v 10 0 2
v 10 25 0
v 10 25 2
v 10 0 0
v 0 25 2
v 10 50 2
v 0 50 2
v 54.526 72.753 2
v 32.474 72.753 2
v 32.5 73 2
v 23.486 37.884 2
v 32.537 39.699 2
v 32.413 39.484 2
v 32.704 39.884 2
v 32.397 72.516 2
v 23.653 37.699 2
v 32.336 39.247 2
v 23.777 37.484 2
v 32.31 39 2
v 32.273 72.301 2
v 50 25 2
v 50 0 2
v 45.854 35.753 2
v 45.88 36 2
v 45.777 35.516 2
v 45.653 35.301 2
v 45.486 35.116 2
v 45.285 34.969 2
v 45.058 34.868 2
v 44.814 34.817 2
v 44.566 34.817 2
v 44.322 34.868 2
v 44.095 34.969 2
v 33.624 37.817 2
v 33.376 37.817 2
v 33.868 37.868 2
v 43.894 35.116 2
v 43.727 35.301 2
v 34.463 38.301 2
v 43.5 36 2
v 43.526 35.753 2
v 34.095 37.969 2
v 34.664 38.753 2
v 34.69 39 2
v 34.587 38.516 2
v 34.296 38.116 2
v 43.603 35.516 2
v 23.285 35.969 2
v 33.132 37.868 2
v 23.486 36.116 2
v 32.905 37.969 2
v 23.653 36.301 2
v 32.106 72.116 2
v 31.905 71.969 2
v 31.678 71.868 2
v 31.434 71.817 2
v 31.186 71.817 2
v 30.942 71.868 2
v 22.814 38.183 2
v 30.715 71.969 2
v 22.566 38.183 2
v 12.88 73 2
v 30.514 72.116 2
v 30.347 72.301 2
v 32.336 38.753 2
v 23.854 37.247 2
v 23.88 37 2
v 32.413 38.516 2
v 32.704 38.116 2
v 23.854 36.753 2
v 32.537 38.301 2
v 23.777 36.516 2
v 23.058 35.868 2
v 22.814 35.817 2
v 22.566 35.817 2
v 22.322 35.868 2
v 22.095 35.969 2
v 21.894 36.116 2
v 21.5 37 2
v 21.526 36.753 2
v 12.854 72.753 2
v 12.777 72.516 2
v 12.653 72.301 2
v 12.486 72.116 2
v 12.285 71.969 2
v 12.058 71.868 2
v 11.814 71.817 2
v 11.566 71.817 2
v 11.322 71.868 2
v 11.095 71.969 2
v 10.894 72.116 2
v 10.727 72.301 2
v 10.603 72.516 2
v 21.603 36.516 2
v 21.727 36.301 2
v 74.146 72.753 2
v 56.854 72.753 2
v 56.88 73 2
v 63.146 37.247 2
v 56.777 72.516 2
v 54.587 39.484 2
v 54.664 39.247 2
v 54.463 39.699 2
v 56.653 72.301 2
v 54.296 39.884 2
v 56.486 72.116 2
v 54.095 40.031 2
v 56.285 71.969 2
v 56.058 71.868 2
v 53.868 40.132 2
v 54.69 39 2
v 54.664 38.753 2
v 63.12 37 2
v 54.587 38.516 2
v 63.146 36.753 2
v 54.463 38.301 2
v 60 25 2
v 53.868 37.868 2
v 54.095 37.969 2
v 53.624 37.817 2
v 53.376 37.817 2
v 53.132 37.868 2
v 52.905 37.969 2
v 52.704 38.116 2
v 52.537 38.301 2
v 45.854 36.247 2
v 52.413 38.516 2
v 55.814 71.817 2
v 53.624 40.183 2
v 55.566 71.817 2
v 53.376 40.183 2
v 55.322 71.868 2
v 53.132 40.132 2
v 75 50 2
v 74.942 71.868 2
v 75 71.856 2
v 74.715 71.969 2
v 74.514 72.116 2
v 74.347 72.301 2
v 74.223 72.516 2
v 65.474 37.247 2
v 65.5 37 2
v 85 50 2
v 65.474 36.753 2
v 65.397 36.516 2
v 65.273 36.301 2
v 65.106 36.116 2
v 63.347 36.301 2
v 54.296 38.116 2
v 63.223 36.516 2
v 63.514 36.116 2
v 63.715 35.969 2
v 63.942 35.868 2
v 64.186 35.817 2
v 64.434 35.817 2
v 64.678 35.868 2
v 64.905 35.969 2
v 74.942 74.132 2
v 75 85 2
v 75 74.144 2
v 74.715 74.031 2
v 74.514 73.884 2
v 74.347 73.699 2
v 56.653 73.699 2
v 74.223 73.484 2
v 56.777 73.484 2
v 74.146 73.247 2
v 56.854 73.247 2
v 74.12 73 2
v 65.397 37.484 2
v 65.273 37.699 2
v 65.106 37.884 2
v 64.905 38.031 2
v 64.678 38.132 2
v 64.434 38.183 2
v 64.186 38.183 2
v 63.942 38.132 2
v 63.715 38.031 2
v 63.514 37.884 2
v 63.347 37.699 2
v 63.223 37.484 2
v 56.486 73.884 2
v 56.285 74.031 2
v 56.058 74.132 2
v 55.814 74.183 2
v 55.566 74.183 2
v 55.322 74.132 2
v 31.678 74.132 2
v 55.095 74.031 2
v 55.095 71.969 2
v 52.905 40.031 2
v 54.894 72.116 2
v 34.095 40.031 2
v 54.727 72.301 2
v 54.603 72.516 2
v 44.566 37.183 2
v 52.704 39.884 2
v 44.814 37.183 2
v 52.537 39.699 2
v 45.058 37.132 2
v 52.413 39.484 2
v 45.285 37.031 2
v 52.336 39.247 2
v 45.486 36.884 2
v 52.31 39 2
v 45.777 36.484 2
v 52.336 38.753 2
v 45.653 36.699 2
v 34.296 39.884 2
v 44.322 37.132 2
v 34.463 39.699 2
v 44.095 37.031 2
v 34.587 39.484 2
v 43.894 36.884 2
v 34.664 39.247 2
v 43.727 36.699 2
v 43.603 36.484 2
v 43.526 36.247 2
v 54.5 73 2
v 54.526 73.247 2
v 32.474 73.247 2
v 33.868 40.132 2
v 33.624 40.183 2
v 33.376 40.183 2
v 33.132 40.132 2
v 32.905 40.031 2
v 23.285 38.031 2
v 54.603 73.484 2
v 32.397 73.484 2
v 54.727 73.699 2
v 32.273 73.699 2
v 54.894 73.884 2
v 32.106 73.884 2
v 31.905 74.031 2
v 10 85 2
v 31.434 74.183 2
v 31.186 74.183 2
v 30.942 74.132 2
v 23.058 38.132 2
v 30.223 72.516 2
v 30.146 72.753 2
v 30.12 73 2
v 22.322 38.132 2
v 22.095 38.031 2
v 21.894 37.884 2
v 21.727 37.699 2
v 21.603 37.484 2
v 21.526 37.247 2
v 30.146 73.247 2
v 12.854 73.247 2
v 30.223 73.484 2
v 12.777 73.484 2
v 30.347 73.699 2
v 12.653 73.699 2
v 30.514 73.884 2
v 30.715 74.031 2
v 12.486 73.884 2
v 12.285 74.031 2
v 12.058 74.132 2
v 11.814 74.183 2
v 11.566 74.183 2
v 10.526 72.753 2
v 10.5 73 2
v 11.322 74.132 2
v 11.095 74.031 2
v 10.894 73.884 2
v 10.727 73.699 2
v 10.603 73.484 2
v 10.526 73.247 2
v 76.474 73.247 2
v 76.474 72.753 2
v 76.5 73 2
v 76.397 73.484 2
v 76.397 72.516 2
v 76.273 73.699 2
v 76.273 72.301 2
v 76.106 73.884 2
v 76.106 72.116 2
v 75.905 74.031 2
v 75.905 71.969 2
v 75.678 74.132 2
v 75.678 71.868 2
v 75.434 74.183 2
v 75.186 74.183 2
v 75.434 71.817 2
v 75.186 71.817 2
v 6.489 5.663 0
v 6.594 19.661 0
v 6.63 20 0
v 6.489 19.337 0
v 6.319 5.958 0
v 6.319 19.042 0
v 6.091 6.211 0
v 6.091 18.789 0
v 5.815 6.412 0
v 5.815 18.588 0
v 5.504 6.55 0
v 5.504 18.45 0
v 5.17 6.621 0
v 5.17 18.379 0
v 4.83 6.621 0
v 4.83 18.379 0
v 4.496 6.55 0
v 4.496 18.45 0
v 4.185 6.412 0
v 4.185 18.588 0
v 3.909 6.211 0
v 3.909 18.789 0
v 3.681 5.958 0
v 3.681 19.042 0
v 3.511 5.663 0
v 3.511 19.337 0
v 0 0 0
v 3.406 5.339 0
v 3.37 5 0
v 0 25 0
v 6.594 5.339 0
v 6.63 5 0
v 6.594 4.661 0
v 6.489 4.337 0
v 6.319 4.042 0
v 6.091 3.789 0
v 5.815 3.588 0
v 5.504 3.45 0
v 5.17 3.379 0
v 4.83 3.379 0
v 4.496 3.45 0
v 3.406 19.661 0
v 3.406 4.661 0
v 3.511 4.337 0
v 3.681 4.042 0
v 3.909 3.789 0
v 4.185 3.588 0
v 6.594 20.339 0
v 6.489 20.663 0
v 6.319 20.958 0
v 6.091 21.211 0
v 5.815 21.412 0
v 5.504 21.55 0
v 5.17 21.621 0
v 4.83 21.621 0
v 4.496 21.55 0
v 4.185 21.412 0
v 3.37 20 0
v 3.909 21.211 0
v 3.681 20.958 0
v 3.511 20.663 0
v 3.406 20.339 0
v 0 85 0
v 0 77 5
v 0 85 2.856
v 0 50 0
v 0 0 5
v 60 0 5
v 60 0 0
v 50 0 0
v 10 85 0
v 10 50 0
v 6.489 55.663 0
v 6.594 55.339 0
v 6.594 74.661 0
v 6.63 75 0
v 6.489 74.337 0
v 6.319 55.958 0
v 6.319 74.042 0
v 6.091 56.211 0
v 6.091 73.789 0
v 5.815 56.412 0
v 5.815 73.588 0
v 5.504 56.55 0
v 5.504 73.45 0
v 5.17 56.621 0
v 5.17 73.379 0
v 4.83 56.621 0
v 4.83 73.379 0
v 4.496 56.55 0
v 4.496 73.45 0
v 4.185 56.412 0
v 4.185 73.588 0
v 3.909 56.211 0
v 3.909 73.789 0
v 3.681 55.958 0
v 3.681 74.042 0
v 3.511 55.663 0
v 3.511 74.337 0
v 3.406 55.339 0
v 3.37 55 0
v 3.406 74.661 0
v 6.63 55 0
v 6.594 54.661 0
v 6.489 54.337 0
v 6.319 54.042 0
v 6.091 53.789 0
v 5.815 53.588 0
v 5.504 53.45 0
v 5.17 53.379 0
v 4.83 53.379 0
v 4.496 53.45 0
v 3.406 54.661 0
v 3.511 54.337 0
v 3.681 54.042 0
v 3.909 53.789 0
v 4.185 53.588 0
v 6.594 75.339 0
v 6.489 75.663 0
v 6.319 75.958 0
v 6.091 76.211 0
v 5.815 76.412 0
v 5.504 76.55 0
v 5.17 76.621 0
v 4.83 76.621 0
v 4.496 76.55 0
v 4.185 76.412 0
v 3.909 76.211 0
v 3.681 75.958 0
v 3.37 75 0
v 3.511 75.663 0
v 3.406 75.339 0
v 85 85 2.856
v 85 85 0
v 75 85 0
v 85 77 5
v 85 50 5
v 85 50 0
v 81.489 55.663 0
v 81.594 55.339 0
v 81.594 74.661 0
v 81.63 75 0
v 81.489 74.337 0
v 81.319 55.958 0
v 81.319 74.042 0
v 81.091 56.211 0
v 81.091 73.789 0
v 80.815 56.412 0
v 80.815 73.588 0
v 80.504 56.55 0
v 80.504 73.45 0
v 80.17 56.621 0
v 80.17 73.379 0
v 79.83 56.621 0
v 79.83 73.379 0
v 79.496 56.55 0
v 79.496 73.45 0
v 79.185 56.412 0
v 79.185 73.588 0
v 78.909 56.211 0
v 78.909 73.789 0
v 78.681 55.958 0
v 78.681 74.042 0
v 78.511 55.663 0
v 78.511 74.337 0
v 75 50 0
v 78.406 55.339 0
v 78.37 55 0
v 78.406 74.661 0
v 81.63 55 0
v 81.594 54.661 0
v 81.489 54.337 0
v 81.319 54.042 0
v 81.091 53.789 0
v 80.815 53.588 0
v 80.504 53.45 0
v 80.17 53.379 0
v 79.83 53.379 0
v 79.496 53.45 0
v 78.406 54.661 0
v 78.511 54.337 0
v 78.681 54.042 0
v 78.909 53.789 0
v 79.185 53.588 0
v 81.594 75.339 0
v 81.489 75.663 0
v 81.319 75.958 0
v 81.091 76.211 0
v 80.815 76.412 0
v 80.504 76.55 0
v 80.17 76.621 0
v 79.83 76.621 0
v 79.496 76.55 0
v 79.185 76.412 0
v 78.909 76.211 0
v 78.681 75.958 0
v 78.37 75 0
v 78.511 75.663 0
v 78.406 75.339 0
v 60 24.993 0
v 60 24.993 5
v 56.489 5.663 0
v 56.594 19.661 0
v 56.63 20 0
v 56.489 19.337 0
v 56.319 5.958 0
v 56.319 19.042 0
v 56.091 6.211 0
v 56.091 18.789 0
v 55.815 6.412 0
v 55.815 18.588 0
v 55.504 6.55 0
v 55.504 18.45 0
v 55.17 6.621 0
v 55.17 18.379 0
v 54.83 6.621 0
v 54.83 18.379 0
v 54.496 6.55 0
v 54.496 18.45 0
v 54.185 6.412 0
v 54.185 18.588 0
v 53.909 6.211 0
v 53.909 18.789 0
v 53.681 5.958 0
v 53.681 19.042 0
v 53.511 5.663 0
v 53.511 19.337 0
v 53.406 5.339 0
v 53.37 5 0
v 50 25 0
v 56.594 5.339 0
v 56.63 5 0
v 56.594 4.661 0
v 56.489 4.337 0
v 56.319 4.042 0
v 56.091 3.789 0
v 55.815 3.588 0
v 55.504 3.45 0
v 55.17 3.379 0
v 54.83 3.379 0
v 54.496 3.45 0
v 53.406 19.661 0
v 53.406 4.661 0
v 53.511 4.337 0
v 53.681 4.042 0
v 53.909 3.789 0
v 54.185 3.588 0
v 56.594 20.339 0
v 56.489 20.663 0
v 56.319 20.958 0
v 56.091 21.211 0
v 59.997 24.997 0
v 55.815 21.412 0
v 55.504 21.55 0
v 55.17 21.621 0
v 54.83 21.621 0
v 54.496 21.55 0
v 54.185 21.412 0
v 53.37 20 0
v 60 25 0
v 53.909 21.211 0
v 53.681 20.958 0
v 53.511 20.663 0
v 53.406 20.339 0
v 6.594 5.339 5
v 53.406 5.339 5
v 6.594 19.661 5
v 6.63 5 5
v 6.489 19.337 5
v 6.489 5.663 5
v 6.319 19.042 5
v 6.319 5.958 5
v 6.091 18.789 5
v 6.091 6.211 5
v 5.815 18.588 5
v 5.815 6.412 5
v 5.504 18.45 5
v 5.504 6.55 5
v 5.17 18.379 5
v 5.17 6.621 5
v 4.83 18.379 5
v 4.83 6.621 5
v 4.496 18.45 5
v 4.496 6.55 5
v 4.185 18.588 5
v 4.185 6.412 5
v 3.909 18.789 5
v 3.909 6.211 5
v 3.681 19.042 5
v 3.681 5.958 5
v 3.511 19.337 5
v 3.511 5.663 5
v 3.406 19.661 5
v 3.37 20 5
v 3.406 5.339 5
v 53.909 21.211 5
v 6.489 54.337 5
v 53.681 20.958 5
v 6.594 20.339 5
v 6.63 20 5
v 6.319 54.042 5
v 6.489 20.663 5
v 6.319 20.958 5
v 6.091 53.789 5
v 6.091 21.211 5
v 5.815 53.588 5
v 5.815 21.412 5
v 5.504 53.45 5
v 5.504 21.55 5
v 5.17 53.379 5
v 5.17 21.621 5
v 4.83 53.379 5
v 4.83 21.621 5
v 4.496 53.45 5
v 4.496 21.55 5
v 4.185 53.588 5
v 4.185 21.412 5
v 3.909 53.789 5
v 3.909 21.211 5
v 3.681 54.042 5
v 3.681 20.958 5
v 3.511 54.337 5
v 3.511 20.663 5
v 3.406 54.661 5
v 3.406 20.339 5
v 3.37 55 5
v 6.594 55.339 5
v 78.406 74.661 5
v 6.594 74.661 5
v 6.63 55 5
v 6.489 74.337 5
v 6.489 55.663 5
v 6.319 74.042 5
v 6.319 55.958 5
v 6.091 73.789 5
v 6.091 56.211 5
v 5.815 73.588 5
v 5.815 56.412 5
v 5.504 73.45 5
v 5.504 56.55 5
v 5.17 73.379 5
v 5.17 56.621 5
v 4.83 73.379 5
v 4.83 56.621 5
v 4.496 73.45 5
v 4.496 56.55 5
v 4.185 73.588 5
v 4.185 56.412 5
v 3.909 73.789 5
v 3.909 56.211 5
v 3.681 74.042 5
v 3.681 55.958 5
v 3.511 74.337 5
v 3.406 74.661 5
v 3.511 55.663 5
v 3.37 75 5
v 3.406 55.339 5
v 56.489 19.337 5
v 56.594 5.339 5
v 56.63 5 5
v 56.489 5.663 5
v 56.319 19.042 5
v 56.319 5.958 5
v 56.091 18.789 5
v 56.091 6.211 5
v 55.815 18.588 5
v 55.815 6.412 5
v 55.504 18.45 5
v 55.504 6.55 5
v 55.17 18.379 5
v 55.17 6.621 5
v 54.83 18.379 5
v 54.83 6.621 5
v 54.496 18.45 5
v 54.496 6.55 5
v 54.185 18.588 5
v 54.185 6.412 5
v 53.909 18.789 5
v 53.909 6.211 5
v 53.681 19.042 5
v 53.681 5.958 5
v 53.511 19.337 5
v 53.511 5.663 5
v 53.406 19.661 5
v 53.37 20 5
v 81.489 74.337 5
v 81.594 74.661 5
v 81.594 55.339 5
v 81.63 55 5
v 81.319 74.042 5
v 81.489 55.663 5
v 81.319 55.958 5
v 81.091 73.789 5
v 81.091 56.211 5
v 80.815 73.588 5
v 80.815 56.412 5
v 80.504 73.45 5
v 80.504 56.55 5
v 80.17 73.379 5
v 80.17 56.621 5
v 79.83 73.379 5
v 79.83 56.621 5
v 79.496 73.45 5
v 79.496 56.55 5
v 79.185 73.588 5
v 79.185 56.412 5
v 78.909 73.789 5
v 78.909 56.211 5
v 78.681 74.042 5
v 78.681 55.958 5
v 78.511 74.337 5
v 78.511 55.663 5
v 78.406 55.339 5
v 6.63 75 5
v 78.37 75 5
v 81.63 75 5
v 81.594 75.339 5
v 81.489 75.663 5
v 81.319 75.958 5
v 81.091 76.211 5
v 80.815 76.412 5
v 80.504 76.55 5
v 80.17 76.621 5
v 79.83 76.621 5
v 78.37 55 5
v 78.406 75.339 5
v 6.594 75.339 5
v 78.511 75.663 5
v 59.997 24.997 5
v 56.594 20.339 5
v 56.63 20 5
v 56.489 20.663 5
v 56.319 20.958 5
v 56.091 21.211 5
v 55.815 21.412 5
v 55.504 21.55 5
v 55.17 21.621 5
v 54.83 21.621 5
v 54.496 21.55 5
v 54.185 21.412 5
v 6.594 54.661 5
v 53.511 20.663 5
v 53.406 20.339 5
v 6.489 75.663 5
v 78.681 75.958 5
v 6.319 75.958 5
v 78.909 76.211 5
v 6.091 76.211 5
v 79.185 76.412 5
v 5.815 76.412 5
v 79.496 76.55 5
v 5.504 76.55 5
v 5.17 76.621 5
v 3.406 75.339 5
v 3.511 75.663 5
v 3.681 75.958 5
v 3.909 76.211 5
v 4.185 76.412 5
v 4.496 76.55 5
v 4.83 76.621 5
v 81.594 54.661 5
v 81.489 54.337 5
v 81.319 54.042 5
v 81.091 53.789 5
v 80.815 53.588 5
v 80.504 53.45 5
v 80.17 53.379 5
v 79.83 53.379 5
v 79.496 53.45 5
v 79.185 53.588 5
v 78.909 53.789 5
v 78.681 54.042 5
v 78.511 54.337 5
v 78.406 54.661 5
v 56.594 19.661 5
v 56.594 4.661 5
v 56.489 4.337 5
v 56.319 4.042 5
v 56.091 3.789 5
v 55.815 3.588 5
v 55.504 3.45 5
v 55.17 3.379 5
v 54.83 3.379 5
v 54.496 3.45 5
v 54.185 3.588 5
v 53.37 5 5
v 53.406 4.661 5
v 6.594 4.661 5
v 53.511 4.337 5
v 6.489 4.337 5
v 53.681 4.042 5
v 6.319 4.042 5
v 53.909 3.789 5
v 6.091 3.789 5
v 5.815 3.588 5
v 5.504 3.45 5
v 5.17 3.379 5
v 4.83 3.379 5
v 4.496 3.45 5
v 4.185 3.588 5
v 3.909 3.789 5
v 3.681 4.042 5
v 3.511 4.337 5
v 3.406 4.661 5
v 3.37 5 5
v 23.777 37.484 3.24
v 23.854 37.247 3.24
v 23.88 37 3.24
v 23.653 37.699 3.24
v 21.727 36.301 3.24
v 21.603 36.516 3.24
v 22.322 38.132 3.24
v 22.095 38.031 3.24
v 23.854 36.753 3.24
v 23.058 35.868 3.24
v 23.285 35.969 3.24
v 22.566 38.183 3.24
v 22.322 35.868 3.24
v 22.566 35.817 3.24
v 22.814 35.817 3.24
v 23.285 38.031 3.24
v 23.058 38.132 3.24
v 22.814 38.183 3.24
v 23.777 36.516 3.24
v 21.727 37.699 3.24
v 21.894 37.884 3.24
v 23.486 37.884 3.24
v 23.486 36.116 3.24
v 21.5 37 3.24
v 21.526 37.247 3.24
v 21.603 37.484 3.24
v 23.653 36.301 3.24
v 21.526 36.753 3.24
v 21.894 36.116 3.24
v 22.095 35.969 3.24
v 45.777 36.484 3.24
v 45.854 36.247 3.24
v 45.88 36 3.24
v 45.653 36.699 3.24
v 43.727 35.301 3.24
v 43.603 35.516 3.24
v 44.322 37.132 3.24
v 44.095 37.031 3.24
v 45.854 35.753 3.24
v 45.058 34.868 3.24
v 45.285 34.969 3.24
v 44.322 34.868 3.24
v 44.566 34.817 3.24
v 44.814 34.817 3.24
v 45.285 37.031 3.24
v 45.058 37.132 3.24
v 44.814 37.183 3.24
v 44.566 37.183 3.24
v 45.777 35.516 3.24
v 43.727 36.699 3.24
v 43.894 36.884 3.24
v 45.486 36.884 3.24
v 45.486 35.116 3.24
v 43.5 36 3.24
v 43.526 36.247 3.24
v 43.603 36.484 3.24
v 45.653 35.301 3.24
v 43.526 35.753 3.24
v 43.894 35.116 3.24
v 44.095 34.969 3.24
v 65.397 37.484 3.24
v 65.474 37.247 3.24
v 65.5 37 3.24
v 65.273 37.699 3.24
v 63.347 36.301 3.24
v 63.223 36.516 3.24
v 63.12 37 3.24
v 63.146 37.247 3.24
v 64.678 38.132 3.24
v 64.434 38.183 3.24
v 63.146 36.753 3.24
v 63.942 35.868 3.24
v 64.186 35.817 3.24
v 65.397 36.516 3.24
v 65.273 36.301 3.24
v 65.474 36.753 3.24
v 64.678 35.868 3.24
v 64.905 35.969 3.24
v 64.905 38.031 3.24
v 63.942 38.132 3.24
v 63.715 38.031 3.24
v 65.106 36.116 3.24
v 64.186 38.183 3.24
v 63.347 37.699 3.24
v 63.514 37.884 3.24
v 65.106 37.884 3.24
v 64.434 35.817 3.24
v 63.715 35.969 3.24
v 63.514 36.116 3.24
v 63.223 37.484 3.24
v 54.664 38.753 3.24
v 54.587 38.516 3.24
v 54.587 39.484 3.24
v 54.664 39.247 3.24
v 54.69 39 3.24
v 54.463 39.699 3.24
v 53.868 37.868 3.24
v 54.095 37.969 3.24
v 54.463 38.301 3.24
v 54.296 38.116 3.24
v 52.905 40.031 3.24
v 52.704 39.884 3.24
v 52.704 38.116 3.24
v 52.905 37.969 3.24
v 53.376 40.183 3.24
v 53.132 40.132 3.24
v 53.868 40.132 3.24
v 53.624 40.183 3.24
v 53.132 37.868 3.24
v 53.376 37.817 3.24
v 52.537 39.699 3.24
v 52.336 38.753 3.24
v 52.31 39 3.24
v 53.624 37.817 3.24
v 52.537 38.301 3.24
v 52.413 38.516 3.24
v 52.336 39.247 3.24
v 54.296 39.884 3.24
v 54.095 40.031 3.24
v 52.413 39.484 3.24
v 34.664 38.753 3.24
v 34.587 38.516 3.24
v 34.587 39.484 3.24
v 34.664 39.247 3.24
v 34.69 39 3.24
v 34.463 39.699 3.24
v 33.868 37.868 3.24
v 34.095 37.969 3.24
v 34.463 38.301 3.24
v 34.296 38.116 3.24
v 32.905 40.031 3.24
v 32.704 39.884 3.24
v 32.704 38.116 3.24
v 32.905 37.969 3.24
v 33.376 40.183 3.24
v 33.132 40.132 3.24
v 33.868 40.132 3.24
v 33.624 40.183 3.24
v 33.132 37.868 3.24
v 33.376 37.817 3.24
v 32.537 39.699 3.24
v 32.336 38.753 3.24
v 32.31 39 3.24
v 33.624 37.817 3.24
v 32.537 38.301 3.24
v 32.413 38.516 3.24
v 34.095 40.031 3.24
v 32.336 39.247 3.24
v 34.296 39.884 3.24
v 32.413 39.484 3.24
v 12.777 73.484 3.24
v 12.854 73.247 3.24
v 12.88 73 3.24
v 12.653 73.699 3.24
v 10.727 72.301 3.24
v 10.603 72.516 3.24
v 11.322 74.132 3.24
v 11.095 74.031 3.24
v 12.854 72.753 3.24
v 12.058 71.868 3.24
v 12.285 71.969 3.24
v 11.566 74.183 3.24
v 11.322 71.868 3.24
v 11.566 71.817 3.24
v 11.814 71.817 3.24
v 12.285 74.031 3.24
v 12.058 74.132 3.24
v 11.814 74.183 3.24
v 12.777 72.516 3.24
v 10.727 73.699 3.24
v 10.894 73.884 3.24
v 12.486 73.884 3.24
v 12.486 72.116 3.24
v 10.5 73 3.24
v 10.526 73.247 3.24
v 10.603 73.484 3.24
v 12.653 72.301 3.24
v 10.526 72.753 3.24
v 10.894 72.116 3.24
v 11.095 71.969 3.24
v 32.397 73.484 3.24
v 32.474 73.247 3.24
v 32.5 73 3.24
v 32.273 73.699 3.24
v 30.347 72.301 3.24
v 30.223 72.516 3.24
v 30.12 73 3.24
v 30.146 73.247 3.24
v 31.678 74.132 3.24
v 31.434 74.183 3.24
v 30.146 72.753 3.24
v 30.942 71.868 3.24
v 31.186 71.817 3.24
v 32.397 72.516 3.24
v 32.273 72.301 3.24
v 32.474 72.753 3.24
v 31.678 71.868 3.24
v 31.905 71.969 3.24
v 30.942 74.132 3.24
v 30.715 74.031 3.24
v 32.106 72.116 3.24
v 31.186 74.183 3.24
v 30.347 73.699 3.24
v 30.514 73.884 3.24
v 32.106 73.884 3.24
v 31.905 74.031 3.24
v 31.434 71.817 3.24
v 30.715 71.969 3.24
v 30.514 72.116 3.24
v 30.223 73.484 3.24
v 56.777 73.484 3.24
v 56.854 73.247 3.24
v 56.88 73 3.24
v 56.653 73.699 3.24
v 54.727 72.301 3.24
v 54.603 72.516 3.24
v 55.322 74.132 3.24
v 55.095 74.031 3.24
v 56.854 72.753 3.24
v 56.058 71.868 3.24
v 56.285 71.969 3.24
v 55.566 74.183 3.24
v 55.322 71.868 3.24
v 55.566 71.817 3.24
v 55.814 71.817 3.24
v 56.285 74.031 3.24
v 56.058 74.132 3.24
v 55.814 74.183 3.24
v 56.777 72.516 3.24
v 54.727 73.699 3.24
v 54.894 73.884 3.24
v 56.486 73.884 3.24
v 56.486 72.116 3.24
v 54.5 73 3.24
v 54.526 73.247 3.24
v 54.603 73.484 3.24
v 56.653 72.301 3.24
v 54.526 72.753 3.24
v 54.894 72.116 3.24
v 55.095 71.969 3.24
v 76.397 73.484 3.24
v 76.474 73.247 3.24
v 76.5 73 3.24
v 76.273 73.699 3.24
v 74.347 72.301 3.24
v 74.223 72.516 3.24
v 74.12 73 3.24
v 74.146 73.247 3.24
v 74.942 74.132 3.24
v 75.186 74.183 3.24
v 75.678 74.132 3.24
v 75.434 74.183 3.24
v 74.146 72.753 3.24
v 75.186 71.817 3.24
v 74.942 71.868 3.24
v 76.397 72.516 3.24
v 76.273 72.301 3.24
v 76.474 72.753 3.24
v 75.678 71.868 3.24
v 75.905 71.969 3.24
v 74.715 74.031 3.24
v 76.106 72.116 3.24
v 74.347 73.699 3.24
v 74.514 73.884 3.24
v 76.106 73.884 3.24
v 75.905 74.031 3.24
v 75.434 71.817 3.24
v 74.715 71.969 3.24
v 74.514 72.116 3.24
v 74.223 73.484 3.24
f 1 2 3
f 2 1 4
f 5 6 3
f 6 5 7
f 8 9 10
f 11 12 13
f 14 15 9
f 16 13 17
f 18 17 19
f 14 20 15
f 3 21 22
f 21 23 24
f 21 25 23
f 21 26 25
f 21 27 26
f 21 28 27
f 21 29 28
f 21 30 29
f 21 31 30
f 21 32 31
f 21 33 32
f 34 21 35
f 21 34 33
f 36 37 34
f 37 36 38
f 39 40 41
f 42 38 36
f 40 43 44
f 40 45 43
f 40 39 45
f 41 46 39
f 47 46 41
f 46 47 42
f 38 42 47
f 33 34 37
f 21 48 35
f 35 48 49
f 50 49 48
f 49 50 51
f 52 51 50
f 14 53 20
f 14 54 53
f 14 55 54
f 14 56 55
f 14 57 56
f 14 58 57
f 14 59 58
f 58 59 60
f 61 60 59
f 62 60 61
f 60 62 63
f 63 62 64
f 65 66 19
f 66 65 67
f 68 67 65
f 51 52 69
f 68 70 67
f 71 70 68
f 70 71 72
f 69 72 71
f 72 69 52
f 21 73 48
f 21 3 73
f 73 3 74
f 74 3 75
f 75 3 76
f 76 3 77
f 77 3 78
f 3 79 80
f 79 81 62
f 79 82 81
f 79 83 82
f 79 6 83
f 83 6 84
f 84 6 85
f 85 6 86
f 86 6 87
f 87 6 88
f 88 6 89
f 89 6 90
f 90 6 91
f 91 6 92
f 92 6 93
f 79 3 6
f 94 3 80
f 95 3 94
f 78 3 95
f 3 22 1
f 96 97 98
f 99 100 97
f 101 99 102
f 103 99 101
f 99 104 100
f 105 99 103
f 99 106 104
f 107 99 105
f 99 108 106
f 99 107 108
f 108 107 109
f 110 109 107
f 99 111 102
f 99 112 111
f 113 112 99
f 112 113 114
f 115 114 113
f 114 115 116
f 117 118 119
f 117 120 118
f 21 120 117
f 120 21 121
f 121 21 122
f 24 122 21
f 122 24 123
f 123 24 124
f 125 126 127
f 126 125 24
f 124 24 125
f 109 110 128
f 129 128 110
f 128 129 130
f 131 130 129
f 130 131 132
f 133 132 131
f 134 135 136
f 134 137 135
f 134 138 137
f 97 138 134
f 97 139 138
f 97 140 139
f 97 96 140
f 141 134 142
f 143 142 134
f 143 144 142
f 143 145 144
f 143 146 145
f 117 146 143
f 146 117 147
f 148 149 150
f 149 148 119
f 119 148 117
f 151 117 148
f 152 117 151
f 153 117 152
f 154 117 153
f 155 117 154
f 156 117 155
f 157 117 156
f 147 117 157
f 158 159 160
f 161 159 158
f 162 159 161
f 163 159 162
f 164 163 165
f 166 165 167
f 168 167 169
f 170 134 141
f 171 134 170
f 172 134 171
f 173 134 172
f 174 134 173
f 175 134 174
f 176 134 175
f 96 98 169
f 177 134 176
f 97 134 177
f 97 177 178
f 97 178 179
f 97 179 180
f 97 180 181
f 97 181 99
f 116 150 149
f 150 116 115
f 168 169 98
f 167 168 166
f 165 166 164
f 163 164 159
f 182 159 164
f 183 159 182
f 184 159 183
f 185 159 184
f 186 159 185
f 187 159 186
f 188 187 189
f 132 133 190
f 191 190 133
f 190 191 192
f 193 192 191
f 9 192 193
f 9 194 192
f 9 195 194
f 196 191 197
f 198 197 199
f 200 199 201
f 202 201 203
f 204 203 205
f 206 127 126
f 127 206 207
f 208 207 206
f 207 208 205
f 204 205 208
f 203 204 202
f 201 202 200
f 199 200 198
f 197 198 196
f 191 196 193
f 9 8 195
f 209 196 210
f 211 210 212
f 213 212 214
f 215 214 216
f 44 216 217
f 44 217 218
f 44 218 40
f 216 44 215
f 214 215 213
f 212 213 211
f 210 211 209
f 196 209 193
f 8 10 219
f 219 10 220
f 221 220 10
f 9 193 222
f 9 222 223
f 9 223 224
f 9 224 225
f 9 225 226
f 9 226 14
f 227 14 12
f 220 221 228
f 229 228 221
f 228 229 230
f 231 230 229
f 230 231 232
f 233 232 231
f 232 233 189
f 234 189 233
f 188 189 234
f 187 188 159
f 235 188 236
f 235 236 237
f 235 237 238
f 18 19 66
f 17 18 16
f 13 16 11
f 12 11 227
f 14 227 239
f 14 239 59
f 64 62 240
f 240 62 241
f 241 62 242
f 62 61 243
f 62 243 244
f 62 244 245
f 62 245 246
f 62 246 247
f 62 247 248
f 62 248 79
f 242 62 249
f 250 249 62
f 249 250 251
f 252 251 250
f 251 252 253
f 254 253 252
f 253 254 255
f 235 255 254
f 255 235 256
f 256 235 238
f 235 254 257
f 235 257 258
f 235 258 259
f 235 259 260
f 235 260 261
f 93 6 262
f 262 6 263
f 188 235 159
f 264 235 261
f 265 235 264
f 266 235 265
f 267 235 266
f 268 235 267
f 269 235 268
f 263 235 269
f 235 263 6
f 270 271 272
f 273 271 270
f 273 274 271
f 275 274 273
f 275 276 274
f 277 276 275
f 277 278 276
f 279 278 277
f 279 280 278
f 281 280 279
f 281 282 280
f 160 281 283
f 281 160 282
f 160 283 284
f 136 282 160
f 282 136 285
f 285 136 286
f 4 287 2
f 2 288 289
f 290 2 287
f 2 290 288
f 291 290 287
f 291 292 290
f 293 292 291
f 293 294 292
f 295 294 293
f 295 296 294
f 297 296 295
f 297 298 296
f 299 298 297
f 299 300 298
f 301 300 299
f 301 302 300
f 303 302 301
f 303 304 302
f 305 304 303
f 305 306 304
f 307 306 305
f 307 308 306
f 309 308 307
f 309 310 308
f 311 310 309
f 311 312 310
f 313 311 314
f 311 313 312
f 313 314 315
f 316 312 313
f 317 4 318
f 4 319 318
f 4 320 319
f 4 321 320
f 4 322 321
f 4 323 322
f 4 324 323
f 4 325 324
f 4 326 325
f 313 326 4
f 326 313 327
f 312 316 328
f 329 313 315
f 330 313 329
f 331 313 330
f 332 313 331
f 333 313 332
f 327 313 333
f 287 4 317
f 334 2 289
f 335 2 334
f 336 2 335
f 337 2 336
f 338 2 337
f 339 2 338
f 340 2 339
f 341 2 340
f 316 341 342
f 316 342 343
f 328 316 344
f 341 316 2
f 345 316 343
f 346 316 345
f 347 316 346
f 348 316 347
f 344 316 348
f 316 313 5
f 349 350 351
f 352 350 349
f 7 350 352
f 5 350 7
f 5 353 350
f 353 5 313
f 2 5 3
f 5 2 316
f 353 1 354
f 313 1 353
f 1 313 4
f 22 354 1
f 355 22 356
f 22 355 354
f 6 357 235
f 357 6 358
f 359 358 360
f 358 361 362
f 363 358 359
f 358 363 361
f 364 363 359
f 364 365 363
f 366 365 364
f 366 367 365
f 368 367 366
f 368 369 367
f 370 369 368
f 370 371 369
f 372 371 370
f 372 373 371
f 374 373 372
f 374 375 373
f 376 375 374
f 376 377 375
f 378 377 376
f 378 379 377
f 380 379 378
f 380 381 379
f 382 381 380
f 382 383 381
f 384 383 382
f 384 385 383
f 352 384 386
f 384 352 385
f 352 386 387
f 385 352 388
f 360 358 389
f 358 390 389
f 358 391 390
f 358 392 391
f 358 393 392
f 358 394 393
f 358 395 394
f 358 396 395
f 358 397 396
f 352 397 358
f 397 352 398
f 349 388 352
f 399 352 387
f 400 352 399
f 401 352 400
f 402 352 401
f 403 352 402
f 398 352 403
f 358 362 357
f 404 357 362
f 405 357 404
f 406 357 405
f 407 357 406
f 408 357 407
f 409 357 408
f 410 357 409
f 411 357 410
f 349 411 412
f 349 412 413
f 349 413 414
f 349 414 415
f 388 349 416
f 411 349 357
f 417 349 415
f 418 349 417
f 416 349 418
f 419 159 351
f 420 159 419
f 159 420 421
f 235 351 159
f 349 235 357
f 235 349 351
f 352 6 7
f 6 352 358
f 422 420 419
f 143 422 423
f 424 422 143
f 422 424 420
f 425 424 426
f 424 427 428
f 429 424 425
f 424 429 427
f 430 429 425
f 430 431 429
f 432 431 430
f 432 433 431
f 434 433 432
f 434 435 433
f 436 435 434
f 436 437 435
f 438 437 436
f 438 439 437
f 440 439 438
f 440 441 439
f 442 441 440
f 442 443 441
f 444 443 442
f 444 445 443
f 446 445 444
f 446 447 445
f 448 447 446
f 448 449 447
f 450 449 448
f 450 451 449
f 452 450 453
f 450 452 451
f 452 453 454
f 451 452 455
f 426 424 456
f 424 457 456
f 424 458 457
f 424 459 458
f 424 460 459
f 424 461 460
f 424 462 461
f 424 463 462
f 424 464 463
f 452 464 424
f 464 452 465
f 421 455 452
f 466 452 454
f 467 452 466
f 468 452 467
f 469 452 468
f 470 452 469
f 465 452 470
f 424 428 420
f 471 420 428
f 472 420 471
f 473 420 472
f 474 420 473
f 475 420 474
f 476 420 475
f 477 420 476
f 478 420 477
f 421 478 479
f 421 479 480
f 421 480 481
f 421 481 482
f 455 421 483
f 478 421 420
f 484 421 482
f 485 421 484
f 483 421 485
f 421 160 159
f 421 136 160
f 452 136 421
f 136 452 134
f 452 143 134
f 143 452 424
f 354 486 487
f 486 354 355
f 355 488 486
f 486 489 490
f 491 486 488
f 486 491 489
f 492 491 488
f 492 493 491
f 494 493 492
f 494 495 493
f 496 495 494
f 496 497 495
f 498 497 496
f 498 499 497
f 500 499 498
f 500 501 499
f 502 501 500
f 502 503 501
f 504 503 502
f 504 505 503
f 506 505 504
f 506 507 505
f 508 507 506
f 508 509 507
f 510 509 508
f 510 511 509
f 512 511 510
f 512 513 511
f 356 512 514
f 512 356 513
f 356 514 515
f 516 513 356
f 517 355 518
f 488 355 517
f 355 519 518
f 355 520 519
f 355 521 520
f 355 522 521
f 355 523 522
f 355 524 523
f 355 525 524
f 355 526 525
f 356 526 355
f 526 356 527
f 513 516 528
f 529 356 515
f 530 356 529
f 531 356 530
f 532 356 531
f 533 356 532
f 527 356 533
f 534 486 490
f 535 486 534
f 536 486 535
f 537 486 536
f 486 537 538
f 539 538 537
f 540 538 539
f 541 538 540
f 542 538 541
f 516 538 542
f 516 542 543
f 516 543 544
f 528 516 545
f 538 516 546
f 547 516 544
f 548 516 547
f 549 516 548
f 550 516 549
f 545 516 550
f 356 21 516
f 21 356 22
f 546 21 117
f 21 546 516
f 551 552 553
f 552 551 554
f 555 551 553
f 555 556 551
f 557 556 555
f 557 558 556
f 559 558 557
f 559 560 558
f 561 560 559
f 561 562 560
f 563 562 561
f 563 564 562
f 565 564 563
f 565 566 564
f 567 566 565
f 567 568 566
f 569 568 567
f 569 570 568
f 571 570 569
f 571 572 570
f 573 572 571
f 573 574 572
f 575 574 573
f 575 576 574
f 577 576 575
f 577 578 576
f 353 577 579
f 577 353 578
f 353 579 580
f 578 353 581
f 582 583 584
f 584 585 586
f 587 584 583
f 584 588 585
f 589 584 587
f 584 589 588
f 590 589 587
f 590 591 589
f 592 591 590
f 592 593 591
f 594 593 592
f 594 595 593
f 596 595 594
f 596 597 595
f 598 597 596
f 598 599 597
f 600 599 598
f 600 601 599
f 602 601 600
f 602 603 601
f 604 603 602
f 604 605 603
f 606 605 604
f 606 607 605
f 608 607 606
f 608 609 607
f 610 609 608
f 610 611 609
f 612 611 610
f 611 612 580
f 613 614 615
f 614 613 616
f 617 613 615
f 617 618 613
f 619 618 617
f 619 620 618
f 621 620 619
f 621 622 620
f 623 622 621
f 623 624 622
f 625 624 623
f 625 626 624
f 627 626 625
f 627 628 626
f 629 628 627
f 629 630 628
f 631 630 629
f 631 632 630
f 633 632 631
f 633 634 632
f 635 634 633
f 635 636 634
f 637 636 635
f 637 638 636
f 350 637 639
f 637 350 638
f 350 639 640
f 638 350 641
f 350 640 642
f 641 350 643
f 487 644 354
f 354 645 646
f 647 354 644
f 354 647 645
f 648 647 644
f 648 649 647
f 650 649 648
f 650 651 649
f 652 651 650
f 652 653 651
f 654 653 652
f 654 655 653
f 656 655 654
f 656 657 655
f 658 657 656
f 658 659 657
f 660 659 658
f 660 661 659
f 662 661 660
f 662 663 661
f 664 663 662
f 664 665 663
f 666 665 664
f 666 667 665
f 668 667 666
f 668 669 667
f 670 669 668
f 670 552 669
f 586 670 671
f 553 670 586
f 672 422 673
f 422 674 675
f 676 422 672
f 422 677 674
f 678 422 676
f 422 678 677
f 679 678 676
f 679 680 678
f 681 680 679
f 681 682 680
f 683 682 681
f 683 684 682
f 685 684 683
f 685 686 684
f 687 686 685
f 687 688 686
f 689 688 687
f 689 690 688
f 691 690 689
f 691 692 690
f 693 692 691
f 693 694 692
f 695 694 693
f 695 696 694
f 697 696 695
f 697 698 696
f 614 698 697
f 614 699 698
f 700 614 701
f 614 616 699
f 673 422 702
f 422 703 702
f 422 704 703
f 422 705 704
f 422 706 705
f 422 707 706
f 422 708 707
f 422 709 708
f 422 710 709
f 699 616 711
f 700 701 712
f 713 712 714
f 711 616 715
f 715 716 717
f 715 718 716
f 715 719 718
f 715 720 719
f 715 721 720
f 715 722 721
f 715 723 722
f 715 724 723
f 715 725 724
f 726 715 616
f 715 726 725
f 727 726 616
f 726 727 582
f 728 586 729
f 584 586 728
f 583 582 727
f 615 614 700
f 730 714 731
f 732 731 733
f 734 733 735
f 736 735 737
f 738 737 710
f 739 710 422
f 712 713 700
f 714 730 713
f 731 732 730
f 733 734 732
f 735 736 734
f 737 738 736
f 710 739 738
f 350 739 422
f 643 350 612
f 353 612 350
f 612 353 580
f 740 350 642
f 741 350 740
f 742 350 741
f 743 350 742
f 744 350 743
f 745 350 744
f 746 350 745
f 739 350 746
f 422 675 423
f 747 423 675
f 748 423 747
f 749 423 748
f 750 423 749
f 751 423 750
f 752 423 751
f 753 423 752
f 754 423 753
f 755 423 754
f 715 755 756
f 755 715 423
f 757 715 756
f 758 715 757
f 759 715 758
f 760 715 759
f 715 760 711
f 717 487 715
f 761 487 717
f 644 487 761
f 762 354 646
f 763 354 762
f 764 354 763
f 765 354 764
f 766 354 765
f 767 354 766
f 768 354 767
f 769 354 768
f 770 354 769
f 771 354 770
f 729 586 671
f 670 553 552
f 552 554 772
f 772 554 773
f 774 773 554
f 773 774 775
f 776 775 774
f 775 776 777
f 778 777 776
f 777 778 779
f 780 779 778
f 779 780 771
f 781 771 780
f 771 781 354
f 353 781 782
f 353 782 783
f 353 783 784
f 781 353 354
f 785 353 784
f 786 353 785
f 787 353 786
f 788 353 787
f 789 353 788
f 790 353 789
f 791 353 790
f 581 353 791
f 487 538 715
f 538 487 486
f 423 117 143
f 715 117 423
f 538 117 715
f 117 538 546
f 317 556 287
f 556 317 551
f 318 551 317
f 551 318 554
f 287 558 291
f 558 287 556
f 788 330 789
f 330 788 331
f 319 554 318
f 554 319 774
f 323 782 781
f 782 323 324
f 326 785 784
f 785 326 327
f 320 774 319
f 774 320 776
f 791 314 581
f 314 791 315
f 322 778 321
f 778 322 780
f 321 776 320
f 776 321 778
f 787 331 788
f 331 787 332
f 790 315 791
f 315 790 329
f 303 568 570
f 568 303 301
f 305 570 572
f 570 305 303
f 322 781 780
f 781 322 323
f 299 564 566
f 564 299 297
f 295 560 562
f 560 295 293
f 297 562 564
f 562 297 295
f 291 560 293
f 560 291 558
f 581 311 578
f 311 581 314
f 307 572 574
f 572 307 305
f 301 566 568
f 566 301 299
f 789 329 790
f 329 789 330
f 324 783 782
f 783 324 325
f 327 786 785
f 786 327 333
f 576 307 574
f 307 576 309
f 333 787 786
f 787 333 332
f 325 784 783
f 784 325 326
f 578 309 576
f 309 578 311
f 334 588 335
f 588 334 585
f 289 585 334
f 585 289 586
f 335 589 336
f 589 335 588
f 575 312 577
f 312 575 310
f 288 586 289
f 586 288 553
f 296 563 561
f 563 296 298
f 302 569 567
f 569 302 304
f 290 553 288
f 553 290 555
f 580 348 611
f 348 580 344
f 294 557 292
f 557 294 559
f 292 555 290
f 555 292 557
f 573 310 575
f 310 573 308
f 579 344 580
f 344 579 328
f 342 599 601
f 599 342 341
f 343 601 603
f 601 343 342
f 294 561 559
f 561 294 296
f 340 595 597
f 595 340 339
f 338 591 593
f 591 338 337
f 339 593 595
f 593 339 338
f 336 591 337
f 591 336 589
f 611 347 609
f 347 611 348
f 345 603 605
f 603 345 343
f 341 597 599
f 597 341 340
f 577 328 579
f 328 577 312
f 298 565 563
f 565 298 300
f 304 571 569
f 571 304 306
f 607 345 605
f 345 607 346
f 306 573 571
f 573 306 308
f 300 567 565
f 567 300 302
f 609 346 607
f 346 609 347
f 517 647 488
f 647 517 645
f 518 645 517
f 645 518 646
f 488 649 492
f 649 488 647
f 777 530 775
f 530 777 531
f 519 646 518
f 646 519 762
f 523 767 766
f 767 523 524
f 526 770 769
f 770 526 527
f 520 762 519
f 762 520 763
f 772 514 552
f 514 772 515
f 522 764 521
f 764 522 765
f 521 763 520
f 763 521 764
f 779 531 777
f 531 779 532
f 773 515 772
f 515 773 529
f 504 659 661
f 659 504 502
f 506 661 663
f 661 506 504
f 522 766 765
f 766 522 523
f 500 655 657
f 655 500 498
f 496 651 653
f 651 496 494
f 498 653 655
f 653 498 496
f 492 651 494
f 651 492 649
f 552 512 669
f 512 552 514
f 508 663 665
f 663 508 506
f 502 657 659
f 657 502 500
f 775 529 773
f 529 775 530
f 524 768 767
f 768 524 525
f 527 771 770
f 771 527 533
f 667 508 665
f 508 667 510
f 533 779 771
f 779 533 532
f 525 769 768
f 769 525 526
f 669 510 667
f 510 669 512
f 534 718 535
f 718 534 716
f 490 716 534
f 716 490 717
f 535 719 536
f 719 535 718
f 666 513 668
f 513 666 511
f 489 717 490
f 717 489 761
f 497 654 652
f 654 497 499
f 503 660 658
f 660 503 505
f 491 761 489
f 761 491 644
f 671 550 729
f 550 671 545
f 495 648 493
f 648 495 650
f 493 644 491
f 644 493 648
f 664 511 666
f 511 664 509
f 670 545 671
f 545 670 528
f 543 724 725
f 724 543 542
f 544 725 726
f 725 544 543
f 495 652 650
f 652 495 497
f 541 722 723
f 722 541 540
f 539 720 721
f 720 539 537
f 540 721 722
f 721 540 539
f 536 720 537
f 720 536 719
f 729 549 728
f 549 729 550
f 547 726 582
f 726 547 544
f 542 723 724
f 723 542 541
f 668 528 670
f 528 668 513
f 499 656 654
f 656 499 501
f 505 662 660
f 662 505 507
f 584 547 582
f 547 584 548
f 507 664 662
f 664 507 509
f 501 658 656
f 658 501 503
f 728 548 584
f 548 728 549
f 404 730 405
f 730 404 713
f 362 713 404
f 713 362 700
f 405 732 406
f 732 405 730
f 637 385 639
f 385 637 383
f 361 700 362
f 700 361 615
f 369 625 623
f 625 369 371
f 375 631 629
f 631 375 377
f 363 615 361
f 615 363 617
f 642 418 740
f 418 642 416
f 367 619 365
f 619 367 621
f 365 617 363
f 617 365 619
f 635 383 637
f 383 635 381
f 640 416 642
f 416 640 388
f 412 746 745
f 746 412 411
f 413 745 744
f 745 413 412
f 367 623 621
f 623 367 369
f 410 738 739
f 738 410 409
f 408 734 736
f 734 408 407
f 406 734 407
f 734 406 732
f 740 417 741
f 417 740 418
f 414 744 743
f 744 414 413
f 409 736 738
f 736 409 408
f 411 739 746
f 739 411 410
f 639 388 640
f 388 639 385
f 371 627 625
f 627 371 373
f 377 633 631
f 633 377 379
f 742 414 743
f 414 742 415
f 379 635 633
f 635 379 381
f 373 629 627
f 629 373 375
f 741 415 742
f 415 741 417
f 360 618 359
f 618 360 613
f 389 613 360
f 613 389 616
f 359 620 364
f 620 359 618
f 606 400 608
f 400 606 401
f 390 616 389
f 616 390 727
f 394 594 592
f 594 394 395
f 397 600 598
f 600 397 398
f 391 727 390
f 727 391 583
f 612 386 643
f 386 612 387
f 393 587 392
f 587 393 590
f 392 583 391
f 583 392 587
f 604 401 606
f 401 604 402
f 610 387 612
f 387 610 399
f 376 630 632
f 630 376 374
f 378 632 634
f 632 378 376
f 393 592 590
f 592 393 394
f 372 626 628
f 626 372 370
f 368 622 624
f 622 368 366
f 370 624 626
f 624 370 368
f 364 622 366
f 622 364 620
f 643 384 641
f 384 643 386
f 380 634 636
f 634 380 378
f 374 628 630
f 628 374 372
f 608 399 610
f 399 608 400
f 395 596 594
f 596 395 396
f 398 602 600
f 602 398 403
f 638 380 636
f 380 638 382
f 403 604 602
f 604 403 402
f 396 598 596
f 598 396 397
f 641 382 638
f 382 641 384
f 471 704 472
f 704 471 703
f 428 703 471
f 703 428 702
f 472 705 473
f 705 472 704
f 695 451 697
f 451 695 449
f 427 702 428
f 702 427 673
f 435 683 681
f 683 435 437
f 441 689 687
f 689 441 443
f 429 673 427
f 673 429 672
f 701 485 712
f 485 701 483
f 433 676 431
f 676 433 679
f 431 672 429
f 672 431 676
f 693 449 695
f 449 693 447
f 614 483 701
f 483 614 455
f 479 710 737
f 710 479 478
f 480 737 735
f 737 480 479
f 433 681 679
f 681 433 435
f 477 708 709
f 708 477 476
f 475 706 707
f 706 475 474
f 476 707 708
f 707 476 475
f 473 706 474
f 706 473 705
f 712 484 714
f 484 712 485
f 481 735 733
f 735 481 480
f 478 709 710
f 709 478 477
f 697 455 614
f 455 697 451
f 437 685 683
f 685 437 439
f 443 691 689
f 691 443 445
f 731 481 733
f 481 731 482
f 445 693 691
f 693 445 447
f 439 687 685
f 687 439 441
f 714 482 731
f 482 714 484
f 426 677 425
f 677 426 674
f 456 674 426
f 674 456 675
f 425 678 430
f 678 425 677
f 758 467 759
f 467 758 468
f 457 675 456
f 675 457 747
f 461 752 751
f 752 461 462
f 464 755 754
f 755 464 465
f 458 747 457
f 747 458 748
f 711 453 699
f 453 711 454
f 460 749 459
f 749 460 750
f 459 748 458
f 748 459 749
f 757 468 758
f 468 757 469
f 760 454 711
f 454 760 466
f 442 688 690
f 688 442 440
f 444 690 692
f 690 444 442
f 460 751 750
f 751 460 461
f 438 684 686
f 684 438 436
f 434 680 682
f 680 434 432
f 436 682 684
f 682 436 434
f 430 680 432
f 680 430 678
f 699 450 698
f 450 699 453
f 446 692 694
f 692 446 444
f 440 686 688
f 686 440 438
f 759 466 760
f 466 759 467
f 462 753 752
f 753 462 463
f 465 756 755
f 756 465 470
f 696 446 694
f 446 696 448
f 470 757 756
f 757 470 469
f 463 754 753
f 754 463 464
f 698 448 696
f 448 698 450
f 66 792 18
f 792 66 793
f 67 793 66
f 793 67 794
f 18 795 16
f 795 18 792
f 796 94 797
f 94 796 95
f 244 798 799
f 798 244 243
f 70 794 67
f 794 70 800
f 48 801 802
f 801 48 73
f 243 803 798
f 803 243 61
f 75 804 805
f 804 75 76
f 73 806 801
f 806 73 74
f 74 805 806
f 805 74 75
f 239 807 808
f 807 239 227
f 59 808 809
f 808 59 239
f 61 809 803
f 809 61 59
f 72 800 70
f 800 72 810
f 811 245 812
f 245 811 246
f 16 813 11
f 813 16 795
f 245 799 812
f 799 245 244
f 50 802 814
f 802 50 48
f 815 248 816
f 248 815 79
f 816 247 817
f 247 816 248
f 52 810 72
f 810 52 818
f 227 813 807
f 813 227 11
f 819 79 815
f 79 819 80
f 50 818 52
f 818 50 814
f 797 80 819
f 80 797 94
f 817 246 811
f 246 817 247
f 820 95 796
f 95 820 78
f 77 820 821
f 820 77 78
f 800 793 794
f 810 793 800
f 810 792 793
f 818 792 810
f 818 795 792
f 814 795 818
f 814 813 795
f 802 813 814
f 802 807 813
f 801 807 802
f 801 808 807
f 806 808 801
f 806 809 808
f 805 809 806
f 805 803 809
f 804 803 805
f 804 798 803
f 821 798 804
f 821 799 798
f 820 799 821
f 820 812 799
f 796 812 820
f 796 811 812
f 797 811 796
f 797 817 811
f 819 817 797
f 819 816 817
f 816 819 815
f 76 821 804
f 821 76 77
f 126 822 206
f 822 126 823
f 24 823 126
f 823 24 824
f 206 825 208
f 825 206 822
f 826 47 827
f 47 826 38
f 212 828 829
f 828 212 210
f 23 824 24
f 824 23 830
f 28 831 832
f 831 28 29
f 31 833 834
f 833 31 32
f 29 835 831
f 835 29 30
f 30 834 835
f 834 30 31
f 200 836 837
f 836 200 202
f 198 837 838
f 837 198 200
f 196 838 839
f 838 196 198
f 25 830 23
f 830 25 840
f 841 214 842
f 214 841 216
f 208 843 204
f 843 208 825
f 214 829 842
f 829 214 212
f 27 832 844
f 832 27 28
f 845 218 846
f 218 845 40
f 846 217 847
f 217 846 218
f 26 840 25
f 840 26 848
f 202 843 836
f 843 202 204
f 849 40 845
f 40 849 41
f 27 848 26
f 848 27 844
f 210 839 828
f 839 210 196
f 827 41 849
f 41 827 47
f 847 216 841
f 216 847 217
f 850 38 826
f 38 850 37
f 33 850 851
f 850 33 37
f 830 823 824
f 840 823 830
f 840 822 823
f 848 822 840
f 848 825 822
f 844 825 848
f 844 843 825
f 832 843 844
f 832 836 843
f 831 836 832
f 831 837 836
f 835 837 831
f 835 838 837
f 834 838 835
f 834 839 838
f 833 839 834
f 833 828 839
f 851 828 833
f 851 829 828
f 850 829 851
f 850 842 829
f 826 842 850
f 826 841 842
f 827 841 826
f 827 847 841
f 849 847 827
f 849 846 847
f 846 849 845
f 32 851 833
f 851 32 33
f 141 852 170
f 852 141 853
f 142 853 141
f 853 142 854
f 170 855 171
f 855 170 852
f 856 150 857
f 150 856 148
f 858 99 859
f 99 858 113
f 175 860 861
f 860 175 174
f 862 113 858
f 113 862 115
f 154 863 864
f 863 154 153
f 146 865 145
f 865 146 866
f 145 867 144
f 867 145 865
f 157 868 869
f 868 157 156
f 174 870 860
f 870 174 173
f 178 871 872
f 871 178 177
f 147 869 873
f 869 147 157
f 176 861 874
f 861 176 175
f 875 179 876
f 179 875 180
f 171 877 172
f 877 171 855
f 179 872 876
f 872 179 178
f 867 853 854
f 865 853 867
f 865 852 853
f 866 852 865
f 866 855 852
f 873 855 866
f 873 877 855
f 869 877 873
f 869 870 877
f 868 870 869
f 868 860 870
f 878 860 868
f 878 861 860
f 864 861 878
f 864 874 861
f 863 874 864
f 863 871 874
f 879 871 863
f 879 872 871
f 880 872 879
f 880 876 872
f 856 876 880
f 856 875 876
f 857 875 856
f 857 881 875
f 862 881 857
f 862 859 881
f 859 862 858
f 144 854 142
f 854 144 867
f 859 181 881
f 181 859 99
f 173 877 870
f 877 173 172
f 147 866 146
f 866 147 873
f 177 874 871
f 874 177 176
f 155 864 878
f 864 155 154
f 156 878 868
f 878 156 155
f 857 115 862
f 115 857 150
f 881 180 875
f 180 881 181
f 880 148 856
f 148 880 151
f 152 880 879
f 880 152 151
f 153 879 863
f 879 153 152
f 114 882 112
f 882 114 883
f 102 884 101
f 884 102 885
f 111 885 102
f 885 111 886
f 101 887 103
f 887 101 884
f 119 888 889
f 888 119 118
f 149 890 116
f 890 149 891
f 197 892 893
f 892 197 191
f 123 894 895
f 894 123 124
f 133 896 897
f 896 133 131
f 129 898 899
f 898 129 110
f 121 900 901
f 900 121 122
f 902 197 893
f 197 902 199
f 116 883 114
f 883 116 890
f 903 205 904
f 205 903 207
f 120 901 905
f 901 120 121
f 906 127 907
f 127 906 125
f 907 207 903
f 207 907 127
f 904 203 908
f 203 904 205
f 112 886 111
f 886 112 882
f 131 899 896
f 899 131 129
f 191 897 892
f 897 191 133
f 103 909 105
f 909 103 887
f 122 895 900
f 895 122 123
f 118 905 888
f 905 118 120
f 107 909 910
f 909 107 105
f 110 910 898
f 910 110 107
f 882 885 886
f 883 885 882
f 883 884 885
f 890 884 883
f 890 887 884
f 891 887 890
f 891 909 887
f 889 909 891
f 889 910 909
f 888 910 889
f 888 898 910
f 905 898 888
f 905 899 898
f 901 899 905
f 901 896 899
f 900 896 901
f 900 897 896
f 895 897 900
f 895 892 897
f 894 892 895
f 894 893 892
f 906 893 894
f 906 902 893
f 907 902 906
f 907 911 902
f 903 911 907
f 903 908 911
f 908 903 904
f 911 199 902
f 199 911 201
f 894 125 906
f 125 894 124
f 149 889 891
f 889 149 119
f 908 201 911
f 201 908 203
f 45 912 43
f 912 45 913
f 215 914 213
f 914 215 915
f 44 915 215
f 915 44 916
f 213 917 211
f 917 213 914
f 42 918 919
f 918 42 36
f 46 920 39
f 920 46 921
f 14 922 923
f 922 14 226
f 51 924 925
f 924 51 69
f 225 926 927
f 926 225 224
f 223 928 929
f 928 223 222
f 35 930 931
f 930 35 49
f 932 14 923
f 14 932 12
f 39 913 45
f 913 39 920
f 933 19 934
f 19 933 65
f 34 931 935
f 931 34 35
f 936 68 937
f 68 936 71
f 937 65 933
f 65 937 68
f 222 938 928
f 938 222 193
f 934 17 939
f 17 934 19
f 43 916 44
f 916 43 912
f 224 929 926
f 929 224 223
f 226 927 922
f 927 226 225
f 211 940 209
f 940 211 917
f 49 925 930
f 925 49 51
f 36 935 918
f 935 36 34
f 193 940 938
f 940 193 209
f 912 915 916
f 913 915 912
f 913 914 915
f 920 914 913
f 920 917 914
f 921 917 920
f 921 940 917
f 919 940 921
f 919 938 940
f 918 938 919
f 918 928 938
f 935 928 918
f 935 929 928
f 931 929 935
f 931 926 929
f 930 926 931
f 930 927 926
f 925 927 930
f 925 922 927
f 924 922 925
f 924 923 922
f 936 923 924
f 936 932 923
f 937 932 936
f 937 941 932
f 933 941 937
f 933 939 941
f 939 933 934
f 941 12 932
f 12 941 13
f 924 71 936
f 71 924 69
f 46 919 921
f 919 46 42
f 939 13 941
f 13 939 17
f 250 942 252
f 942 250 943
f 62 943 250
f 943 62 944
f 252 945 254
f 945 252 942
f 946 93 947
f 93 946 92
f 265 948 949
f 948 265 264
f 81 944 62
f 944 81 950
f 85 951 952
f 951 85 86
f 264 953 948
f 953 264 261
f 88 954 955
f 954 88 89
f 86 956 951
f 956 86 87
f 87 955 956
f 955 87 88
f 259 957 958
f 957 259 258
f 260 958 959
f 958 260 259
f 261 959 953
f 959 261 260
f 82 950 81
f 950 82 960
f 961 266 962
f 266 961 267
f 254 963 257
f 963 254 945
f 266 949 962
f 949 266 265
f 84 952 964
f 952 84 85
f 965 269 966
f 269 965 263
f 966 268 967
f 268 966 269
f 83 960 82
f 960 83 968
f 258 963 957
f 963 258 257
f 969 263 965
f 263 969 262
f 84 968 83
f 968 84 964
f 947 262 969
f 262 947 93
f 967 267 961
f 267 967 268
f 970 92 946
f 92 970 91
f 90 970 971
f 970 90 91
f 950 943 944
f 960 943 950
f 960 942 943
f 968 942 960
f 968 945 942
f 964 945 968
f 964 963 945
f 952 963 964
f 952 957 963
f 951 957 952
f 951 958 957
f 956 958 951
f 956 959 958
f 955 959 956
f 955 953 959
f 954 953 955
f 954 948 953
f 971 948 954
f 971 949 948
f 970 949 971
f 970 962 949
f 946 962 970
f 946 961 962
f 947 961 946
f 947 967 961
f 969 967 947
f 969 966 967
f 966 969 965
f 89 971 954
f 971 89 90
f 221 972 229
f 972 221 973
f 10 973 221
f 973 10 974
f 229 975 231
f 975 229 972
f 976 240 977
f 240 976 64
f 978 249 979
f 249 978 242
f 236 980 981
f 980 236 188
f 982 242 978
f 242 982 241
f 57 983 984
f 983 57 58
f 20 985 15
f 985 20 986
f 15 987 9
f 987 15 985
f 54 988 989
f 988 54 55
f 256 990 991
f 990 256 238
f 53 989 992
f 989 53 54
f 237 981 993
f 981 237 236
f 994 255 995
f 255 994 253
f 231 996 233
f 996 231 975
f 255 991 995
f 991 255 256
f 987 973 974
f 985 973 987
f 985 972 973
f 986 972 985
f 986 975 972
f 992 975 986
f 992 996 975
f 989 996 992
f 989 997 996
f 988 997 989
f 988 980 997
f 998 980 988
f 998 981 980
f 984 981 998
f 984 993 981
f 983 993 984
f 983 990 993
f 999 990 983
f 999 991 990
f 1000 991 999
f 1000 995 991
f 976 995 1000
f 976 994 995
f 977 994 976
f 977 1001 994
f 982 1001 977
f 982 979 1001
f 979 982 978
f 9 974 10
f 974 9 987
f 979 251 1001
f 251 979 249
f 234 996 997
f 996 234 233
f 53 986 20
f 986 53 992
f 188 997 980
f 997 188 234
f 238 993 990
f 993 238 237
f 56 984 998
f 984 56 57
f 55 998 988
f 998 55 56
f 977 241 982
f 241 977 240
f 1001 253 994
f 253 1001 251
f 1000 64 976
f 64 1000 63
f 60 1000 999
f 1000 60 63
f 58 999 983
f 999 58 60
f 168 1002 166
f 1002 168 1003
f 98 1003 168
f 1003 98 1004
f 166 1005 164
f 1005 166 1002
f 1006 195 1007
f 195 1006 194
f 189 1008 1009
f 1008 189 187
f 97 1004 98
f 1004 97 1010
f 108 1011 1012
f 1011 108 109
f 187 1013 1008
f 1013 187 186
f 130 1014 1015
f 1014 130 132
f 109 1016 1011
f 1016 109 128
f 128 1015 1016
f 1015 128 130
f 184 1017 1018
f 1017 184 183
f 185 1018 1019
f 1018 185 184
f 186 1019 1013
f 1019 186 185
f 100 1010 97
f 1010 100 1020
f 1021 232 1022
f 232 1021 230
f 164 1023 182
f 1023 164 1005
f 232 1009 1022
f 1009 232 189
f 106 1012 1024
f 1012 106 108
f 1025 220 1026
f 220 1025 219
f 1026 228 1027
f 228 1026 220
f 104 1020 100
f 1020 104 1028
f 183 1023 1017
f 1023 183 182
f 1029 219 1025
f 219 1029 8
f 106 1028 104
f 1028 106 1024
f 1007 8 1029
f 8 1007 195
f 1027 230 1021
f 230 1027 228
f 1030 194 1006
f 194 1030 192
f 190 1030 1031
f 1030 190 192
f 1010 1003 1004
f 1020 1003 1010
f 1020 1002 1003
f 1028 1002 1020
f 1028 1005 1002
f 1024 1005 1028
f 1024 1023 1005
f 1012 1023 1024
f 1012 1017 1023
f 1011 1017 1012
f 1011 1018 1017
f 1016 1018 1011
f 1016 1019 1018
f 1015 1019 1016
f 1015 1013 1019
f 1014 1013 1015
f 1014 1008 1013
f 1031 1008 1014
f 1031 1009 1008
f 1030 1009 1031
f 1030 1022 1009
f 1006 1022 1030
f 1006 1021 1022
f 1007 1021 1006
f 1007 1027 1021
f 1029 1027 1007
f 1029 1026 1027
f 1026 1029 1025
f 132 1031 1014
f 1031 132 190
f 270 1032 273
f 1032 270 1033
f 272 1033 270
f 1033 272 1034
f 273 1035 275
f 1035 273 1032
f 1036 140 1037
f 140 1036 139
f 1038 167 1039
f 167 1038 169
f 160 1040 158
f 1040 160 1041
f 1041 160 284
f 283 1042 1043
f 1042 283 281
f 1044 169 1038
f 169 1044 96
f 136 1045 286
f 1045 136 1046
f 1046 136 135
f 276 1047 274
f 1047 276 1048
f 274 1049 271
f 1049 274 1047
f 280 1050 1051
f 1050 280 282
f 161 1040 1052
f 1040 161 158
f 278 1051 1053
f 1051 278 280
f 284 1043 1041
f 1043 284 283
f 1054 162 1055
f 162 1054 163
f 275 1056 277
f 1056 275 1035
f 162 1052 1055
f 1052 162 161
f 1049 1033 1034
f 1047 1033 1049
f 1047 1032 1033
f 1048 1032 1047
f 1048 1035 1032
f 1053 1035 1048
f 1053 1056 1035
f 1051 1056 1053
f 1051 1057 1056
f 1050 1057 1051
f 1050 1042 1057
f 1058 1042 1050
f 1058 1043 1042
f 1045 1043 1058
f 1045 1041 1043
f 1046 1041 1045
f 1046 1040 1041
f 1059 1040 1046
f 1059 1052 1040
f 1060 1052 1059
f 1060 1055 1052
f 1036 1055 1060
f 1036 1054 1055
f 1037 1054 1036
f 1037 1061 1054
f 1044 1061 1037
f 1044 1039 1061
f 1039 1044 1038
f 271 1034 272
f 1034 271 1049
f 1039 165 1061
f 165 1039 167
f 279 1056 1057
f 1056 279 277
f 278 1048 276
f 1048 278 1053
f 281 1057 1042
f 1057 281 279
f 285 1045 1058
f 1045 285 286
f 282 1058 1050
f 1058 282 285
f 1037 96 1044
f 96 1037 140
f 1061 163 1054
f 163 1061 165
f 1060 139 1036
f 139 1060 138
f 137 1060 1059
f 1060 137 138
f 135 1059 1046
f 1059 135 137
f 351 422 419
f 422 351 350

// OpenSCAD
length=85;
wrist=60;
width=85;
res=30;
//length
difference(){
union(){
    //palm part
cube([10,25,2]); 
translate([0,length-35,0])cube([10,35,2]);
translate([wrist+25-10,length-35,0]) cube([10,35,2]);
translate([wrist-10,0,0]) cube([10,25,2]);   
translate([0,0,2])cube([wrist+25,length,3]);
}
union(){
    //thumb section
translate([85,50,0]) rotate([0,0,45+180]) cube([35.36,50,6]);
translate([wrist,0,0]) cube([length-wrist,25,6]);
    
    //screw holes
translate([5,5,0]) cylinder(10,r=3.26/2,true,$fn=30);
translate([5,20,0]) cylinder(10,r=3.26/2,true,$fn=30);   
translate([wrist-5,5,0]) cylinder(10,r=3.26/2,true,$fn=30);
translate([wrist-5,20,0]) cylinder(10,r=3.26/2,true,$fn=30);
    

translate([5,length-10,0]) cylinder(10,r=3.26/2,true,$fn=30);
translate([5,length-30,0]) cylinder(10,r=3.26/2,true,$fn=30);
translate([wrist+25-5,length-10,0]) cylinder(10,r=3.26/2,true,$fn=30);
translate([wrist+25-5,length-30,0]) cylinder(10,r=3.26/2,true,$fn=30);

    //internal screws
translate([22.69,37,2]) cylinder(1.24,r=2.38/2,true,$fn=res);
translate([44.69,36,2]) cylinder(1.24,r=2.38/2,true,$fn=res);
translate([64.31,37,2]) cylinder(1.24,r=2.38/2,true,$fn=res); 
translate([53.5,39,2]) cylinder(1.24,r=2.38/2,true,$fn=res);
translate([33.5,39,2]) cylinder(1.24,r=2.38/2,true,$fn=res);
    
translate([11.69,73,2]) cylinder(1.24,r=2.38/2,true,$fn=res);
translate([31.31,73,2]) cylinder(1.24,r=2.38/2,true,$fn=res);
translate([55.69,73,2]) cylinder(1.24,r=2.38/2,true,$fn=res);  
translate([75.31,73,2]) cylinder(1.24,r=2.38/2,true,$fn=res);     
    
    //chamfer
translate([0,length-8,5]) rotate([360-15,0,0]) cube([width,50,5]);

}
}
